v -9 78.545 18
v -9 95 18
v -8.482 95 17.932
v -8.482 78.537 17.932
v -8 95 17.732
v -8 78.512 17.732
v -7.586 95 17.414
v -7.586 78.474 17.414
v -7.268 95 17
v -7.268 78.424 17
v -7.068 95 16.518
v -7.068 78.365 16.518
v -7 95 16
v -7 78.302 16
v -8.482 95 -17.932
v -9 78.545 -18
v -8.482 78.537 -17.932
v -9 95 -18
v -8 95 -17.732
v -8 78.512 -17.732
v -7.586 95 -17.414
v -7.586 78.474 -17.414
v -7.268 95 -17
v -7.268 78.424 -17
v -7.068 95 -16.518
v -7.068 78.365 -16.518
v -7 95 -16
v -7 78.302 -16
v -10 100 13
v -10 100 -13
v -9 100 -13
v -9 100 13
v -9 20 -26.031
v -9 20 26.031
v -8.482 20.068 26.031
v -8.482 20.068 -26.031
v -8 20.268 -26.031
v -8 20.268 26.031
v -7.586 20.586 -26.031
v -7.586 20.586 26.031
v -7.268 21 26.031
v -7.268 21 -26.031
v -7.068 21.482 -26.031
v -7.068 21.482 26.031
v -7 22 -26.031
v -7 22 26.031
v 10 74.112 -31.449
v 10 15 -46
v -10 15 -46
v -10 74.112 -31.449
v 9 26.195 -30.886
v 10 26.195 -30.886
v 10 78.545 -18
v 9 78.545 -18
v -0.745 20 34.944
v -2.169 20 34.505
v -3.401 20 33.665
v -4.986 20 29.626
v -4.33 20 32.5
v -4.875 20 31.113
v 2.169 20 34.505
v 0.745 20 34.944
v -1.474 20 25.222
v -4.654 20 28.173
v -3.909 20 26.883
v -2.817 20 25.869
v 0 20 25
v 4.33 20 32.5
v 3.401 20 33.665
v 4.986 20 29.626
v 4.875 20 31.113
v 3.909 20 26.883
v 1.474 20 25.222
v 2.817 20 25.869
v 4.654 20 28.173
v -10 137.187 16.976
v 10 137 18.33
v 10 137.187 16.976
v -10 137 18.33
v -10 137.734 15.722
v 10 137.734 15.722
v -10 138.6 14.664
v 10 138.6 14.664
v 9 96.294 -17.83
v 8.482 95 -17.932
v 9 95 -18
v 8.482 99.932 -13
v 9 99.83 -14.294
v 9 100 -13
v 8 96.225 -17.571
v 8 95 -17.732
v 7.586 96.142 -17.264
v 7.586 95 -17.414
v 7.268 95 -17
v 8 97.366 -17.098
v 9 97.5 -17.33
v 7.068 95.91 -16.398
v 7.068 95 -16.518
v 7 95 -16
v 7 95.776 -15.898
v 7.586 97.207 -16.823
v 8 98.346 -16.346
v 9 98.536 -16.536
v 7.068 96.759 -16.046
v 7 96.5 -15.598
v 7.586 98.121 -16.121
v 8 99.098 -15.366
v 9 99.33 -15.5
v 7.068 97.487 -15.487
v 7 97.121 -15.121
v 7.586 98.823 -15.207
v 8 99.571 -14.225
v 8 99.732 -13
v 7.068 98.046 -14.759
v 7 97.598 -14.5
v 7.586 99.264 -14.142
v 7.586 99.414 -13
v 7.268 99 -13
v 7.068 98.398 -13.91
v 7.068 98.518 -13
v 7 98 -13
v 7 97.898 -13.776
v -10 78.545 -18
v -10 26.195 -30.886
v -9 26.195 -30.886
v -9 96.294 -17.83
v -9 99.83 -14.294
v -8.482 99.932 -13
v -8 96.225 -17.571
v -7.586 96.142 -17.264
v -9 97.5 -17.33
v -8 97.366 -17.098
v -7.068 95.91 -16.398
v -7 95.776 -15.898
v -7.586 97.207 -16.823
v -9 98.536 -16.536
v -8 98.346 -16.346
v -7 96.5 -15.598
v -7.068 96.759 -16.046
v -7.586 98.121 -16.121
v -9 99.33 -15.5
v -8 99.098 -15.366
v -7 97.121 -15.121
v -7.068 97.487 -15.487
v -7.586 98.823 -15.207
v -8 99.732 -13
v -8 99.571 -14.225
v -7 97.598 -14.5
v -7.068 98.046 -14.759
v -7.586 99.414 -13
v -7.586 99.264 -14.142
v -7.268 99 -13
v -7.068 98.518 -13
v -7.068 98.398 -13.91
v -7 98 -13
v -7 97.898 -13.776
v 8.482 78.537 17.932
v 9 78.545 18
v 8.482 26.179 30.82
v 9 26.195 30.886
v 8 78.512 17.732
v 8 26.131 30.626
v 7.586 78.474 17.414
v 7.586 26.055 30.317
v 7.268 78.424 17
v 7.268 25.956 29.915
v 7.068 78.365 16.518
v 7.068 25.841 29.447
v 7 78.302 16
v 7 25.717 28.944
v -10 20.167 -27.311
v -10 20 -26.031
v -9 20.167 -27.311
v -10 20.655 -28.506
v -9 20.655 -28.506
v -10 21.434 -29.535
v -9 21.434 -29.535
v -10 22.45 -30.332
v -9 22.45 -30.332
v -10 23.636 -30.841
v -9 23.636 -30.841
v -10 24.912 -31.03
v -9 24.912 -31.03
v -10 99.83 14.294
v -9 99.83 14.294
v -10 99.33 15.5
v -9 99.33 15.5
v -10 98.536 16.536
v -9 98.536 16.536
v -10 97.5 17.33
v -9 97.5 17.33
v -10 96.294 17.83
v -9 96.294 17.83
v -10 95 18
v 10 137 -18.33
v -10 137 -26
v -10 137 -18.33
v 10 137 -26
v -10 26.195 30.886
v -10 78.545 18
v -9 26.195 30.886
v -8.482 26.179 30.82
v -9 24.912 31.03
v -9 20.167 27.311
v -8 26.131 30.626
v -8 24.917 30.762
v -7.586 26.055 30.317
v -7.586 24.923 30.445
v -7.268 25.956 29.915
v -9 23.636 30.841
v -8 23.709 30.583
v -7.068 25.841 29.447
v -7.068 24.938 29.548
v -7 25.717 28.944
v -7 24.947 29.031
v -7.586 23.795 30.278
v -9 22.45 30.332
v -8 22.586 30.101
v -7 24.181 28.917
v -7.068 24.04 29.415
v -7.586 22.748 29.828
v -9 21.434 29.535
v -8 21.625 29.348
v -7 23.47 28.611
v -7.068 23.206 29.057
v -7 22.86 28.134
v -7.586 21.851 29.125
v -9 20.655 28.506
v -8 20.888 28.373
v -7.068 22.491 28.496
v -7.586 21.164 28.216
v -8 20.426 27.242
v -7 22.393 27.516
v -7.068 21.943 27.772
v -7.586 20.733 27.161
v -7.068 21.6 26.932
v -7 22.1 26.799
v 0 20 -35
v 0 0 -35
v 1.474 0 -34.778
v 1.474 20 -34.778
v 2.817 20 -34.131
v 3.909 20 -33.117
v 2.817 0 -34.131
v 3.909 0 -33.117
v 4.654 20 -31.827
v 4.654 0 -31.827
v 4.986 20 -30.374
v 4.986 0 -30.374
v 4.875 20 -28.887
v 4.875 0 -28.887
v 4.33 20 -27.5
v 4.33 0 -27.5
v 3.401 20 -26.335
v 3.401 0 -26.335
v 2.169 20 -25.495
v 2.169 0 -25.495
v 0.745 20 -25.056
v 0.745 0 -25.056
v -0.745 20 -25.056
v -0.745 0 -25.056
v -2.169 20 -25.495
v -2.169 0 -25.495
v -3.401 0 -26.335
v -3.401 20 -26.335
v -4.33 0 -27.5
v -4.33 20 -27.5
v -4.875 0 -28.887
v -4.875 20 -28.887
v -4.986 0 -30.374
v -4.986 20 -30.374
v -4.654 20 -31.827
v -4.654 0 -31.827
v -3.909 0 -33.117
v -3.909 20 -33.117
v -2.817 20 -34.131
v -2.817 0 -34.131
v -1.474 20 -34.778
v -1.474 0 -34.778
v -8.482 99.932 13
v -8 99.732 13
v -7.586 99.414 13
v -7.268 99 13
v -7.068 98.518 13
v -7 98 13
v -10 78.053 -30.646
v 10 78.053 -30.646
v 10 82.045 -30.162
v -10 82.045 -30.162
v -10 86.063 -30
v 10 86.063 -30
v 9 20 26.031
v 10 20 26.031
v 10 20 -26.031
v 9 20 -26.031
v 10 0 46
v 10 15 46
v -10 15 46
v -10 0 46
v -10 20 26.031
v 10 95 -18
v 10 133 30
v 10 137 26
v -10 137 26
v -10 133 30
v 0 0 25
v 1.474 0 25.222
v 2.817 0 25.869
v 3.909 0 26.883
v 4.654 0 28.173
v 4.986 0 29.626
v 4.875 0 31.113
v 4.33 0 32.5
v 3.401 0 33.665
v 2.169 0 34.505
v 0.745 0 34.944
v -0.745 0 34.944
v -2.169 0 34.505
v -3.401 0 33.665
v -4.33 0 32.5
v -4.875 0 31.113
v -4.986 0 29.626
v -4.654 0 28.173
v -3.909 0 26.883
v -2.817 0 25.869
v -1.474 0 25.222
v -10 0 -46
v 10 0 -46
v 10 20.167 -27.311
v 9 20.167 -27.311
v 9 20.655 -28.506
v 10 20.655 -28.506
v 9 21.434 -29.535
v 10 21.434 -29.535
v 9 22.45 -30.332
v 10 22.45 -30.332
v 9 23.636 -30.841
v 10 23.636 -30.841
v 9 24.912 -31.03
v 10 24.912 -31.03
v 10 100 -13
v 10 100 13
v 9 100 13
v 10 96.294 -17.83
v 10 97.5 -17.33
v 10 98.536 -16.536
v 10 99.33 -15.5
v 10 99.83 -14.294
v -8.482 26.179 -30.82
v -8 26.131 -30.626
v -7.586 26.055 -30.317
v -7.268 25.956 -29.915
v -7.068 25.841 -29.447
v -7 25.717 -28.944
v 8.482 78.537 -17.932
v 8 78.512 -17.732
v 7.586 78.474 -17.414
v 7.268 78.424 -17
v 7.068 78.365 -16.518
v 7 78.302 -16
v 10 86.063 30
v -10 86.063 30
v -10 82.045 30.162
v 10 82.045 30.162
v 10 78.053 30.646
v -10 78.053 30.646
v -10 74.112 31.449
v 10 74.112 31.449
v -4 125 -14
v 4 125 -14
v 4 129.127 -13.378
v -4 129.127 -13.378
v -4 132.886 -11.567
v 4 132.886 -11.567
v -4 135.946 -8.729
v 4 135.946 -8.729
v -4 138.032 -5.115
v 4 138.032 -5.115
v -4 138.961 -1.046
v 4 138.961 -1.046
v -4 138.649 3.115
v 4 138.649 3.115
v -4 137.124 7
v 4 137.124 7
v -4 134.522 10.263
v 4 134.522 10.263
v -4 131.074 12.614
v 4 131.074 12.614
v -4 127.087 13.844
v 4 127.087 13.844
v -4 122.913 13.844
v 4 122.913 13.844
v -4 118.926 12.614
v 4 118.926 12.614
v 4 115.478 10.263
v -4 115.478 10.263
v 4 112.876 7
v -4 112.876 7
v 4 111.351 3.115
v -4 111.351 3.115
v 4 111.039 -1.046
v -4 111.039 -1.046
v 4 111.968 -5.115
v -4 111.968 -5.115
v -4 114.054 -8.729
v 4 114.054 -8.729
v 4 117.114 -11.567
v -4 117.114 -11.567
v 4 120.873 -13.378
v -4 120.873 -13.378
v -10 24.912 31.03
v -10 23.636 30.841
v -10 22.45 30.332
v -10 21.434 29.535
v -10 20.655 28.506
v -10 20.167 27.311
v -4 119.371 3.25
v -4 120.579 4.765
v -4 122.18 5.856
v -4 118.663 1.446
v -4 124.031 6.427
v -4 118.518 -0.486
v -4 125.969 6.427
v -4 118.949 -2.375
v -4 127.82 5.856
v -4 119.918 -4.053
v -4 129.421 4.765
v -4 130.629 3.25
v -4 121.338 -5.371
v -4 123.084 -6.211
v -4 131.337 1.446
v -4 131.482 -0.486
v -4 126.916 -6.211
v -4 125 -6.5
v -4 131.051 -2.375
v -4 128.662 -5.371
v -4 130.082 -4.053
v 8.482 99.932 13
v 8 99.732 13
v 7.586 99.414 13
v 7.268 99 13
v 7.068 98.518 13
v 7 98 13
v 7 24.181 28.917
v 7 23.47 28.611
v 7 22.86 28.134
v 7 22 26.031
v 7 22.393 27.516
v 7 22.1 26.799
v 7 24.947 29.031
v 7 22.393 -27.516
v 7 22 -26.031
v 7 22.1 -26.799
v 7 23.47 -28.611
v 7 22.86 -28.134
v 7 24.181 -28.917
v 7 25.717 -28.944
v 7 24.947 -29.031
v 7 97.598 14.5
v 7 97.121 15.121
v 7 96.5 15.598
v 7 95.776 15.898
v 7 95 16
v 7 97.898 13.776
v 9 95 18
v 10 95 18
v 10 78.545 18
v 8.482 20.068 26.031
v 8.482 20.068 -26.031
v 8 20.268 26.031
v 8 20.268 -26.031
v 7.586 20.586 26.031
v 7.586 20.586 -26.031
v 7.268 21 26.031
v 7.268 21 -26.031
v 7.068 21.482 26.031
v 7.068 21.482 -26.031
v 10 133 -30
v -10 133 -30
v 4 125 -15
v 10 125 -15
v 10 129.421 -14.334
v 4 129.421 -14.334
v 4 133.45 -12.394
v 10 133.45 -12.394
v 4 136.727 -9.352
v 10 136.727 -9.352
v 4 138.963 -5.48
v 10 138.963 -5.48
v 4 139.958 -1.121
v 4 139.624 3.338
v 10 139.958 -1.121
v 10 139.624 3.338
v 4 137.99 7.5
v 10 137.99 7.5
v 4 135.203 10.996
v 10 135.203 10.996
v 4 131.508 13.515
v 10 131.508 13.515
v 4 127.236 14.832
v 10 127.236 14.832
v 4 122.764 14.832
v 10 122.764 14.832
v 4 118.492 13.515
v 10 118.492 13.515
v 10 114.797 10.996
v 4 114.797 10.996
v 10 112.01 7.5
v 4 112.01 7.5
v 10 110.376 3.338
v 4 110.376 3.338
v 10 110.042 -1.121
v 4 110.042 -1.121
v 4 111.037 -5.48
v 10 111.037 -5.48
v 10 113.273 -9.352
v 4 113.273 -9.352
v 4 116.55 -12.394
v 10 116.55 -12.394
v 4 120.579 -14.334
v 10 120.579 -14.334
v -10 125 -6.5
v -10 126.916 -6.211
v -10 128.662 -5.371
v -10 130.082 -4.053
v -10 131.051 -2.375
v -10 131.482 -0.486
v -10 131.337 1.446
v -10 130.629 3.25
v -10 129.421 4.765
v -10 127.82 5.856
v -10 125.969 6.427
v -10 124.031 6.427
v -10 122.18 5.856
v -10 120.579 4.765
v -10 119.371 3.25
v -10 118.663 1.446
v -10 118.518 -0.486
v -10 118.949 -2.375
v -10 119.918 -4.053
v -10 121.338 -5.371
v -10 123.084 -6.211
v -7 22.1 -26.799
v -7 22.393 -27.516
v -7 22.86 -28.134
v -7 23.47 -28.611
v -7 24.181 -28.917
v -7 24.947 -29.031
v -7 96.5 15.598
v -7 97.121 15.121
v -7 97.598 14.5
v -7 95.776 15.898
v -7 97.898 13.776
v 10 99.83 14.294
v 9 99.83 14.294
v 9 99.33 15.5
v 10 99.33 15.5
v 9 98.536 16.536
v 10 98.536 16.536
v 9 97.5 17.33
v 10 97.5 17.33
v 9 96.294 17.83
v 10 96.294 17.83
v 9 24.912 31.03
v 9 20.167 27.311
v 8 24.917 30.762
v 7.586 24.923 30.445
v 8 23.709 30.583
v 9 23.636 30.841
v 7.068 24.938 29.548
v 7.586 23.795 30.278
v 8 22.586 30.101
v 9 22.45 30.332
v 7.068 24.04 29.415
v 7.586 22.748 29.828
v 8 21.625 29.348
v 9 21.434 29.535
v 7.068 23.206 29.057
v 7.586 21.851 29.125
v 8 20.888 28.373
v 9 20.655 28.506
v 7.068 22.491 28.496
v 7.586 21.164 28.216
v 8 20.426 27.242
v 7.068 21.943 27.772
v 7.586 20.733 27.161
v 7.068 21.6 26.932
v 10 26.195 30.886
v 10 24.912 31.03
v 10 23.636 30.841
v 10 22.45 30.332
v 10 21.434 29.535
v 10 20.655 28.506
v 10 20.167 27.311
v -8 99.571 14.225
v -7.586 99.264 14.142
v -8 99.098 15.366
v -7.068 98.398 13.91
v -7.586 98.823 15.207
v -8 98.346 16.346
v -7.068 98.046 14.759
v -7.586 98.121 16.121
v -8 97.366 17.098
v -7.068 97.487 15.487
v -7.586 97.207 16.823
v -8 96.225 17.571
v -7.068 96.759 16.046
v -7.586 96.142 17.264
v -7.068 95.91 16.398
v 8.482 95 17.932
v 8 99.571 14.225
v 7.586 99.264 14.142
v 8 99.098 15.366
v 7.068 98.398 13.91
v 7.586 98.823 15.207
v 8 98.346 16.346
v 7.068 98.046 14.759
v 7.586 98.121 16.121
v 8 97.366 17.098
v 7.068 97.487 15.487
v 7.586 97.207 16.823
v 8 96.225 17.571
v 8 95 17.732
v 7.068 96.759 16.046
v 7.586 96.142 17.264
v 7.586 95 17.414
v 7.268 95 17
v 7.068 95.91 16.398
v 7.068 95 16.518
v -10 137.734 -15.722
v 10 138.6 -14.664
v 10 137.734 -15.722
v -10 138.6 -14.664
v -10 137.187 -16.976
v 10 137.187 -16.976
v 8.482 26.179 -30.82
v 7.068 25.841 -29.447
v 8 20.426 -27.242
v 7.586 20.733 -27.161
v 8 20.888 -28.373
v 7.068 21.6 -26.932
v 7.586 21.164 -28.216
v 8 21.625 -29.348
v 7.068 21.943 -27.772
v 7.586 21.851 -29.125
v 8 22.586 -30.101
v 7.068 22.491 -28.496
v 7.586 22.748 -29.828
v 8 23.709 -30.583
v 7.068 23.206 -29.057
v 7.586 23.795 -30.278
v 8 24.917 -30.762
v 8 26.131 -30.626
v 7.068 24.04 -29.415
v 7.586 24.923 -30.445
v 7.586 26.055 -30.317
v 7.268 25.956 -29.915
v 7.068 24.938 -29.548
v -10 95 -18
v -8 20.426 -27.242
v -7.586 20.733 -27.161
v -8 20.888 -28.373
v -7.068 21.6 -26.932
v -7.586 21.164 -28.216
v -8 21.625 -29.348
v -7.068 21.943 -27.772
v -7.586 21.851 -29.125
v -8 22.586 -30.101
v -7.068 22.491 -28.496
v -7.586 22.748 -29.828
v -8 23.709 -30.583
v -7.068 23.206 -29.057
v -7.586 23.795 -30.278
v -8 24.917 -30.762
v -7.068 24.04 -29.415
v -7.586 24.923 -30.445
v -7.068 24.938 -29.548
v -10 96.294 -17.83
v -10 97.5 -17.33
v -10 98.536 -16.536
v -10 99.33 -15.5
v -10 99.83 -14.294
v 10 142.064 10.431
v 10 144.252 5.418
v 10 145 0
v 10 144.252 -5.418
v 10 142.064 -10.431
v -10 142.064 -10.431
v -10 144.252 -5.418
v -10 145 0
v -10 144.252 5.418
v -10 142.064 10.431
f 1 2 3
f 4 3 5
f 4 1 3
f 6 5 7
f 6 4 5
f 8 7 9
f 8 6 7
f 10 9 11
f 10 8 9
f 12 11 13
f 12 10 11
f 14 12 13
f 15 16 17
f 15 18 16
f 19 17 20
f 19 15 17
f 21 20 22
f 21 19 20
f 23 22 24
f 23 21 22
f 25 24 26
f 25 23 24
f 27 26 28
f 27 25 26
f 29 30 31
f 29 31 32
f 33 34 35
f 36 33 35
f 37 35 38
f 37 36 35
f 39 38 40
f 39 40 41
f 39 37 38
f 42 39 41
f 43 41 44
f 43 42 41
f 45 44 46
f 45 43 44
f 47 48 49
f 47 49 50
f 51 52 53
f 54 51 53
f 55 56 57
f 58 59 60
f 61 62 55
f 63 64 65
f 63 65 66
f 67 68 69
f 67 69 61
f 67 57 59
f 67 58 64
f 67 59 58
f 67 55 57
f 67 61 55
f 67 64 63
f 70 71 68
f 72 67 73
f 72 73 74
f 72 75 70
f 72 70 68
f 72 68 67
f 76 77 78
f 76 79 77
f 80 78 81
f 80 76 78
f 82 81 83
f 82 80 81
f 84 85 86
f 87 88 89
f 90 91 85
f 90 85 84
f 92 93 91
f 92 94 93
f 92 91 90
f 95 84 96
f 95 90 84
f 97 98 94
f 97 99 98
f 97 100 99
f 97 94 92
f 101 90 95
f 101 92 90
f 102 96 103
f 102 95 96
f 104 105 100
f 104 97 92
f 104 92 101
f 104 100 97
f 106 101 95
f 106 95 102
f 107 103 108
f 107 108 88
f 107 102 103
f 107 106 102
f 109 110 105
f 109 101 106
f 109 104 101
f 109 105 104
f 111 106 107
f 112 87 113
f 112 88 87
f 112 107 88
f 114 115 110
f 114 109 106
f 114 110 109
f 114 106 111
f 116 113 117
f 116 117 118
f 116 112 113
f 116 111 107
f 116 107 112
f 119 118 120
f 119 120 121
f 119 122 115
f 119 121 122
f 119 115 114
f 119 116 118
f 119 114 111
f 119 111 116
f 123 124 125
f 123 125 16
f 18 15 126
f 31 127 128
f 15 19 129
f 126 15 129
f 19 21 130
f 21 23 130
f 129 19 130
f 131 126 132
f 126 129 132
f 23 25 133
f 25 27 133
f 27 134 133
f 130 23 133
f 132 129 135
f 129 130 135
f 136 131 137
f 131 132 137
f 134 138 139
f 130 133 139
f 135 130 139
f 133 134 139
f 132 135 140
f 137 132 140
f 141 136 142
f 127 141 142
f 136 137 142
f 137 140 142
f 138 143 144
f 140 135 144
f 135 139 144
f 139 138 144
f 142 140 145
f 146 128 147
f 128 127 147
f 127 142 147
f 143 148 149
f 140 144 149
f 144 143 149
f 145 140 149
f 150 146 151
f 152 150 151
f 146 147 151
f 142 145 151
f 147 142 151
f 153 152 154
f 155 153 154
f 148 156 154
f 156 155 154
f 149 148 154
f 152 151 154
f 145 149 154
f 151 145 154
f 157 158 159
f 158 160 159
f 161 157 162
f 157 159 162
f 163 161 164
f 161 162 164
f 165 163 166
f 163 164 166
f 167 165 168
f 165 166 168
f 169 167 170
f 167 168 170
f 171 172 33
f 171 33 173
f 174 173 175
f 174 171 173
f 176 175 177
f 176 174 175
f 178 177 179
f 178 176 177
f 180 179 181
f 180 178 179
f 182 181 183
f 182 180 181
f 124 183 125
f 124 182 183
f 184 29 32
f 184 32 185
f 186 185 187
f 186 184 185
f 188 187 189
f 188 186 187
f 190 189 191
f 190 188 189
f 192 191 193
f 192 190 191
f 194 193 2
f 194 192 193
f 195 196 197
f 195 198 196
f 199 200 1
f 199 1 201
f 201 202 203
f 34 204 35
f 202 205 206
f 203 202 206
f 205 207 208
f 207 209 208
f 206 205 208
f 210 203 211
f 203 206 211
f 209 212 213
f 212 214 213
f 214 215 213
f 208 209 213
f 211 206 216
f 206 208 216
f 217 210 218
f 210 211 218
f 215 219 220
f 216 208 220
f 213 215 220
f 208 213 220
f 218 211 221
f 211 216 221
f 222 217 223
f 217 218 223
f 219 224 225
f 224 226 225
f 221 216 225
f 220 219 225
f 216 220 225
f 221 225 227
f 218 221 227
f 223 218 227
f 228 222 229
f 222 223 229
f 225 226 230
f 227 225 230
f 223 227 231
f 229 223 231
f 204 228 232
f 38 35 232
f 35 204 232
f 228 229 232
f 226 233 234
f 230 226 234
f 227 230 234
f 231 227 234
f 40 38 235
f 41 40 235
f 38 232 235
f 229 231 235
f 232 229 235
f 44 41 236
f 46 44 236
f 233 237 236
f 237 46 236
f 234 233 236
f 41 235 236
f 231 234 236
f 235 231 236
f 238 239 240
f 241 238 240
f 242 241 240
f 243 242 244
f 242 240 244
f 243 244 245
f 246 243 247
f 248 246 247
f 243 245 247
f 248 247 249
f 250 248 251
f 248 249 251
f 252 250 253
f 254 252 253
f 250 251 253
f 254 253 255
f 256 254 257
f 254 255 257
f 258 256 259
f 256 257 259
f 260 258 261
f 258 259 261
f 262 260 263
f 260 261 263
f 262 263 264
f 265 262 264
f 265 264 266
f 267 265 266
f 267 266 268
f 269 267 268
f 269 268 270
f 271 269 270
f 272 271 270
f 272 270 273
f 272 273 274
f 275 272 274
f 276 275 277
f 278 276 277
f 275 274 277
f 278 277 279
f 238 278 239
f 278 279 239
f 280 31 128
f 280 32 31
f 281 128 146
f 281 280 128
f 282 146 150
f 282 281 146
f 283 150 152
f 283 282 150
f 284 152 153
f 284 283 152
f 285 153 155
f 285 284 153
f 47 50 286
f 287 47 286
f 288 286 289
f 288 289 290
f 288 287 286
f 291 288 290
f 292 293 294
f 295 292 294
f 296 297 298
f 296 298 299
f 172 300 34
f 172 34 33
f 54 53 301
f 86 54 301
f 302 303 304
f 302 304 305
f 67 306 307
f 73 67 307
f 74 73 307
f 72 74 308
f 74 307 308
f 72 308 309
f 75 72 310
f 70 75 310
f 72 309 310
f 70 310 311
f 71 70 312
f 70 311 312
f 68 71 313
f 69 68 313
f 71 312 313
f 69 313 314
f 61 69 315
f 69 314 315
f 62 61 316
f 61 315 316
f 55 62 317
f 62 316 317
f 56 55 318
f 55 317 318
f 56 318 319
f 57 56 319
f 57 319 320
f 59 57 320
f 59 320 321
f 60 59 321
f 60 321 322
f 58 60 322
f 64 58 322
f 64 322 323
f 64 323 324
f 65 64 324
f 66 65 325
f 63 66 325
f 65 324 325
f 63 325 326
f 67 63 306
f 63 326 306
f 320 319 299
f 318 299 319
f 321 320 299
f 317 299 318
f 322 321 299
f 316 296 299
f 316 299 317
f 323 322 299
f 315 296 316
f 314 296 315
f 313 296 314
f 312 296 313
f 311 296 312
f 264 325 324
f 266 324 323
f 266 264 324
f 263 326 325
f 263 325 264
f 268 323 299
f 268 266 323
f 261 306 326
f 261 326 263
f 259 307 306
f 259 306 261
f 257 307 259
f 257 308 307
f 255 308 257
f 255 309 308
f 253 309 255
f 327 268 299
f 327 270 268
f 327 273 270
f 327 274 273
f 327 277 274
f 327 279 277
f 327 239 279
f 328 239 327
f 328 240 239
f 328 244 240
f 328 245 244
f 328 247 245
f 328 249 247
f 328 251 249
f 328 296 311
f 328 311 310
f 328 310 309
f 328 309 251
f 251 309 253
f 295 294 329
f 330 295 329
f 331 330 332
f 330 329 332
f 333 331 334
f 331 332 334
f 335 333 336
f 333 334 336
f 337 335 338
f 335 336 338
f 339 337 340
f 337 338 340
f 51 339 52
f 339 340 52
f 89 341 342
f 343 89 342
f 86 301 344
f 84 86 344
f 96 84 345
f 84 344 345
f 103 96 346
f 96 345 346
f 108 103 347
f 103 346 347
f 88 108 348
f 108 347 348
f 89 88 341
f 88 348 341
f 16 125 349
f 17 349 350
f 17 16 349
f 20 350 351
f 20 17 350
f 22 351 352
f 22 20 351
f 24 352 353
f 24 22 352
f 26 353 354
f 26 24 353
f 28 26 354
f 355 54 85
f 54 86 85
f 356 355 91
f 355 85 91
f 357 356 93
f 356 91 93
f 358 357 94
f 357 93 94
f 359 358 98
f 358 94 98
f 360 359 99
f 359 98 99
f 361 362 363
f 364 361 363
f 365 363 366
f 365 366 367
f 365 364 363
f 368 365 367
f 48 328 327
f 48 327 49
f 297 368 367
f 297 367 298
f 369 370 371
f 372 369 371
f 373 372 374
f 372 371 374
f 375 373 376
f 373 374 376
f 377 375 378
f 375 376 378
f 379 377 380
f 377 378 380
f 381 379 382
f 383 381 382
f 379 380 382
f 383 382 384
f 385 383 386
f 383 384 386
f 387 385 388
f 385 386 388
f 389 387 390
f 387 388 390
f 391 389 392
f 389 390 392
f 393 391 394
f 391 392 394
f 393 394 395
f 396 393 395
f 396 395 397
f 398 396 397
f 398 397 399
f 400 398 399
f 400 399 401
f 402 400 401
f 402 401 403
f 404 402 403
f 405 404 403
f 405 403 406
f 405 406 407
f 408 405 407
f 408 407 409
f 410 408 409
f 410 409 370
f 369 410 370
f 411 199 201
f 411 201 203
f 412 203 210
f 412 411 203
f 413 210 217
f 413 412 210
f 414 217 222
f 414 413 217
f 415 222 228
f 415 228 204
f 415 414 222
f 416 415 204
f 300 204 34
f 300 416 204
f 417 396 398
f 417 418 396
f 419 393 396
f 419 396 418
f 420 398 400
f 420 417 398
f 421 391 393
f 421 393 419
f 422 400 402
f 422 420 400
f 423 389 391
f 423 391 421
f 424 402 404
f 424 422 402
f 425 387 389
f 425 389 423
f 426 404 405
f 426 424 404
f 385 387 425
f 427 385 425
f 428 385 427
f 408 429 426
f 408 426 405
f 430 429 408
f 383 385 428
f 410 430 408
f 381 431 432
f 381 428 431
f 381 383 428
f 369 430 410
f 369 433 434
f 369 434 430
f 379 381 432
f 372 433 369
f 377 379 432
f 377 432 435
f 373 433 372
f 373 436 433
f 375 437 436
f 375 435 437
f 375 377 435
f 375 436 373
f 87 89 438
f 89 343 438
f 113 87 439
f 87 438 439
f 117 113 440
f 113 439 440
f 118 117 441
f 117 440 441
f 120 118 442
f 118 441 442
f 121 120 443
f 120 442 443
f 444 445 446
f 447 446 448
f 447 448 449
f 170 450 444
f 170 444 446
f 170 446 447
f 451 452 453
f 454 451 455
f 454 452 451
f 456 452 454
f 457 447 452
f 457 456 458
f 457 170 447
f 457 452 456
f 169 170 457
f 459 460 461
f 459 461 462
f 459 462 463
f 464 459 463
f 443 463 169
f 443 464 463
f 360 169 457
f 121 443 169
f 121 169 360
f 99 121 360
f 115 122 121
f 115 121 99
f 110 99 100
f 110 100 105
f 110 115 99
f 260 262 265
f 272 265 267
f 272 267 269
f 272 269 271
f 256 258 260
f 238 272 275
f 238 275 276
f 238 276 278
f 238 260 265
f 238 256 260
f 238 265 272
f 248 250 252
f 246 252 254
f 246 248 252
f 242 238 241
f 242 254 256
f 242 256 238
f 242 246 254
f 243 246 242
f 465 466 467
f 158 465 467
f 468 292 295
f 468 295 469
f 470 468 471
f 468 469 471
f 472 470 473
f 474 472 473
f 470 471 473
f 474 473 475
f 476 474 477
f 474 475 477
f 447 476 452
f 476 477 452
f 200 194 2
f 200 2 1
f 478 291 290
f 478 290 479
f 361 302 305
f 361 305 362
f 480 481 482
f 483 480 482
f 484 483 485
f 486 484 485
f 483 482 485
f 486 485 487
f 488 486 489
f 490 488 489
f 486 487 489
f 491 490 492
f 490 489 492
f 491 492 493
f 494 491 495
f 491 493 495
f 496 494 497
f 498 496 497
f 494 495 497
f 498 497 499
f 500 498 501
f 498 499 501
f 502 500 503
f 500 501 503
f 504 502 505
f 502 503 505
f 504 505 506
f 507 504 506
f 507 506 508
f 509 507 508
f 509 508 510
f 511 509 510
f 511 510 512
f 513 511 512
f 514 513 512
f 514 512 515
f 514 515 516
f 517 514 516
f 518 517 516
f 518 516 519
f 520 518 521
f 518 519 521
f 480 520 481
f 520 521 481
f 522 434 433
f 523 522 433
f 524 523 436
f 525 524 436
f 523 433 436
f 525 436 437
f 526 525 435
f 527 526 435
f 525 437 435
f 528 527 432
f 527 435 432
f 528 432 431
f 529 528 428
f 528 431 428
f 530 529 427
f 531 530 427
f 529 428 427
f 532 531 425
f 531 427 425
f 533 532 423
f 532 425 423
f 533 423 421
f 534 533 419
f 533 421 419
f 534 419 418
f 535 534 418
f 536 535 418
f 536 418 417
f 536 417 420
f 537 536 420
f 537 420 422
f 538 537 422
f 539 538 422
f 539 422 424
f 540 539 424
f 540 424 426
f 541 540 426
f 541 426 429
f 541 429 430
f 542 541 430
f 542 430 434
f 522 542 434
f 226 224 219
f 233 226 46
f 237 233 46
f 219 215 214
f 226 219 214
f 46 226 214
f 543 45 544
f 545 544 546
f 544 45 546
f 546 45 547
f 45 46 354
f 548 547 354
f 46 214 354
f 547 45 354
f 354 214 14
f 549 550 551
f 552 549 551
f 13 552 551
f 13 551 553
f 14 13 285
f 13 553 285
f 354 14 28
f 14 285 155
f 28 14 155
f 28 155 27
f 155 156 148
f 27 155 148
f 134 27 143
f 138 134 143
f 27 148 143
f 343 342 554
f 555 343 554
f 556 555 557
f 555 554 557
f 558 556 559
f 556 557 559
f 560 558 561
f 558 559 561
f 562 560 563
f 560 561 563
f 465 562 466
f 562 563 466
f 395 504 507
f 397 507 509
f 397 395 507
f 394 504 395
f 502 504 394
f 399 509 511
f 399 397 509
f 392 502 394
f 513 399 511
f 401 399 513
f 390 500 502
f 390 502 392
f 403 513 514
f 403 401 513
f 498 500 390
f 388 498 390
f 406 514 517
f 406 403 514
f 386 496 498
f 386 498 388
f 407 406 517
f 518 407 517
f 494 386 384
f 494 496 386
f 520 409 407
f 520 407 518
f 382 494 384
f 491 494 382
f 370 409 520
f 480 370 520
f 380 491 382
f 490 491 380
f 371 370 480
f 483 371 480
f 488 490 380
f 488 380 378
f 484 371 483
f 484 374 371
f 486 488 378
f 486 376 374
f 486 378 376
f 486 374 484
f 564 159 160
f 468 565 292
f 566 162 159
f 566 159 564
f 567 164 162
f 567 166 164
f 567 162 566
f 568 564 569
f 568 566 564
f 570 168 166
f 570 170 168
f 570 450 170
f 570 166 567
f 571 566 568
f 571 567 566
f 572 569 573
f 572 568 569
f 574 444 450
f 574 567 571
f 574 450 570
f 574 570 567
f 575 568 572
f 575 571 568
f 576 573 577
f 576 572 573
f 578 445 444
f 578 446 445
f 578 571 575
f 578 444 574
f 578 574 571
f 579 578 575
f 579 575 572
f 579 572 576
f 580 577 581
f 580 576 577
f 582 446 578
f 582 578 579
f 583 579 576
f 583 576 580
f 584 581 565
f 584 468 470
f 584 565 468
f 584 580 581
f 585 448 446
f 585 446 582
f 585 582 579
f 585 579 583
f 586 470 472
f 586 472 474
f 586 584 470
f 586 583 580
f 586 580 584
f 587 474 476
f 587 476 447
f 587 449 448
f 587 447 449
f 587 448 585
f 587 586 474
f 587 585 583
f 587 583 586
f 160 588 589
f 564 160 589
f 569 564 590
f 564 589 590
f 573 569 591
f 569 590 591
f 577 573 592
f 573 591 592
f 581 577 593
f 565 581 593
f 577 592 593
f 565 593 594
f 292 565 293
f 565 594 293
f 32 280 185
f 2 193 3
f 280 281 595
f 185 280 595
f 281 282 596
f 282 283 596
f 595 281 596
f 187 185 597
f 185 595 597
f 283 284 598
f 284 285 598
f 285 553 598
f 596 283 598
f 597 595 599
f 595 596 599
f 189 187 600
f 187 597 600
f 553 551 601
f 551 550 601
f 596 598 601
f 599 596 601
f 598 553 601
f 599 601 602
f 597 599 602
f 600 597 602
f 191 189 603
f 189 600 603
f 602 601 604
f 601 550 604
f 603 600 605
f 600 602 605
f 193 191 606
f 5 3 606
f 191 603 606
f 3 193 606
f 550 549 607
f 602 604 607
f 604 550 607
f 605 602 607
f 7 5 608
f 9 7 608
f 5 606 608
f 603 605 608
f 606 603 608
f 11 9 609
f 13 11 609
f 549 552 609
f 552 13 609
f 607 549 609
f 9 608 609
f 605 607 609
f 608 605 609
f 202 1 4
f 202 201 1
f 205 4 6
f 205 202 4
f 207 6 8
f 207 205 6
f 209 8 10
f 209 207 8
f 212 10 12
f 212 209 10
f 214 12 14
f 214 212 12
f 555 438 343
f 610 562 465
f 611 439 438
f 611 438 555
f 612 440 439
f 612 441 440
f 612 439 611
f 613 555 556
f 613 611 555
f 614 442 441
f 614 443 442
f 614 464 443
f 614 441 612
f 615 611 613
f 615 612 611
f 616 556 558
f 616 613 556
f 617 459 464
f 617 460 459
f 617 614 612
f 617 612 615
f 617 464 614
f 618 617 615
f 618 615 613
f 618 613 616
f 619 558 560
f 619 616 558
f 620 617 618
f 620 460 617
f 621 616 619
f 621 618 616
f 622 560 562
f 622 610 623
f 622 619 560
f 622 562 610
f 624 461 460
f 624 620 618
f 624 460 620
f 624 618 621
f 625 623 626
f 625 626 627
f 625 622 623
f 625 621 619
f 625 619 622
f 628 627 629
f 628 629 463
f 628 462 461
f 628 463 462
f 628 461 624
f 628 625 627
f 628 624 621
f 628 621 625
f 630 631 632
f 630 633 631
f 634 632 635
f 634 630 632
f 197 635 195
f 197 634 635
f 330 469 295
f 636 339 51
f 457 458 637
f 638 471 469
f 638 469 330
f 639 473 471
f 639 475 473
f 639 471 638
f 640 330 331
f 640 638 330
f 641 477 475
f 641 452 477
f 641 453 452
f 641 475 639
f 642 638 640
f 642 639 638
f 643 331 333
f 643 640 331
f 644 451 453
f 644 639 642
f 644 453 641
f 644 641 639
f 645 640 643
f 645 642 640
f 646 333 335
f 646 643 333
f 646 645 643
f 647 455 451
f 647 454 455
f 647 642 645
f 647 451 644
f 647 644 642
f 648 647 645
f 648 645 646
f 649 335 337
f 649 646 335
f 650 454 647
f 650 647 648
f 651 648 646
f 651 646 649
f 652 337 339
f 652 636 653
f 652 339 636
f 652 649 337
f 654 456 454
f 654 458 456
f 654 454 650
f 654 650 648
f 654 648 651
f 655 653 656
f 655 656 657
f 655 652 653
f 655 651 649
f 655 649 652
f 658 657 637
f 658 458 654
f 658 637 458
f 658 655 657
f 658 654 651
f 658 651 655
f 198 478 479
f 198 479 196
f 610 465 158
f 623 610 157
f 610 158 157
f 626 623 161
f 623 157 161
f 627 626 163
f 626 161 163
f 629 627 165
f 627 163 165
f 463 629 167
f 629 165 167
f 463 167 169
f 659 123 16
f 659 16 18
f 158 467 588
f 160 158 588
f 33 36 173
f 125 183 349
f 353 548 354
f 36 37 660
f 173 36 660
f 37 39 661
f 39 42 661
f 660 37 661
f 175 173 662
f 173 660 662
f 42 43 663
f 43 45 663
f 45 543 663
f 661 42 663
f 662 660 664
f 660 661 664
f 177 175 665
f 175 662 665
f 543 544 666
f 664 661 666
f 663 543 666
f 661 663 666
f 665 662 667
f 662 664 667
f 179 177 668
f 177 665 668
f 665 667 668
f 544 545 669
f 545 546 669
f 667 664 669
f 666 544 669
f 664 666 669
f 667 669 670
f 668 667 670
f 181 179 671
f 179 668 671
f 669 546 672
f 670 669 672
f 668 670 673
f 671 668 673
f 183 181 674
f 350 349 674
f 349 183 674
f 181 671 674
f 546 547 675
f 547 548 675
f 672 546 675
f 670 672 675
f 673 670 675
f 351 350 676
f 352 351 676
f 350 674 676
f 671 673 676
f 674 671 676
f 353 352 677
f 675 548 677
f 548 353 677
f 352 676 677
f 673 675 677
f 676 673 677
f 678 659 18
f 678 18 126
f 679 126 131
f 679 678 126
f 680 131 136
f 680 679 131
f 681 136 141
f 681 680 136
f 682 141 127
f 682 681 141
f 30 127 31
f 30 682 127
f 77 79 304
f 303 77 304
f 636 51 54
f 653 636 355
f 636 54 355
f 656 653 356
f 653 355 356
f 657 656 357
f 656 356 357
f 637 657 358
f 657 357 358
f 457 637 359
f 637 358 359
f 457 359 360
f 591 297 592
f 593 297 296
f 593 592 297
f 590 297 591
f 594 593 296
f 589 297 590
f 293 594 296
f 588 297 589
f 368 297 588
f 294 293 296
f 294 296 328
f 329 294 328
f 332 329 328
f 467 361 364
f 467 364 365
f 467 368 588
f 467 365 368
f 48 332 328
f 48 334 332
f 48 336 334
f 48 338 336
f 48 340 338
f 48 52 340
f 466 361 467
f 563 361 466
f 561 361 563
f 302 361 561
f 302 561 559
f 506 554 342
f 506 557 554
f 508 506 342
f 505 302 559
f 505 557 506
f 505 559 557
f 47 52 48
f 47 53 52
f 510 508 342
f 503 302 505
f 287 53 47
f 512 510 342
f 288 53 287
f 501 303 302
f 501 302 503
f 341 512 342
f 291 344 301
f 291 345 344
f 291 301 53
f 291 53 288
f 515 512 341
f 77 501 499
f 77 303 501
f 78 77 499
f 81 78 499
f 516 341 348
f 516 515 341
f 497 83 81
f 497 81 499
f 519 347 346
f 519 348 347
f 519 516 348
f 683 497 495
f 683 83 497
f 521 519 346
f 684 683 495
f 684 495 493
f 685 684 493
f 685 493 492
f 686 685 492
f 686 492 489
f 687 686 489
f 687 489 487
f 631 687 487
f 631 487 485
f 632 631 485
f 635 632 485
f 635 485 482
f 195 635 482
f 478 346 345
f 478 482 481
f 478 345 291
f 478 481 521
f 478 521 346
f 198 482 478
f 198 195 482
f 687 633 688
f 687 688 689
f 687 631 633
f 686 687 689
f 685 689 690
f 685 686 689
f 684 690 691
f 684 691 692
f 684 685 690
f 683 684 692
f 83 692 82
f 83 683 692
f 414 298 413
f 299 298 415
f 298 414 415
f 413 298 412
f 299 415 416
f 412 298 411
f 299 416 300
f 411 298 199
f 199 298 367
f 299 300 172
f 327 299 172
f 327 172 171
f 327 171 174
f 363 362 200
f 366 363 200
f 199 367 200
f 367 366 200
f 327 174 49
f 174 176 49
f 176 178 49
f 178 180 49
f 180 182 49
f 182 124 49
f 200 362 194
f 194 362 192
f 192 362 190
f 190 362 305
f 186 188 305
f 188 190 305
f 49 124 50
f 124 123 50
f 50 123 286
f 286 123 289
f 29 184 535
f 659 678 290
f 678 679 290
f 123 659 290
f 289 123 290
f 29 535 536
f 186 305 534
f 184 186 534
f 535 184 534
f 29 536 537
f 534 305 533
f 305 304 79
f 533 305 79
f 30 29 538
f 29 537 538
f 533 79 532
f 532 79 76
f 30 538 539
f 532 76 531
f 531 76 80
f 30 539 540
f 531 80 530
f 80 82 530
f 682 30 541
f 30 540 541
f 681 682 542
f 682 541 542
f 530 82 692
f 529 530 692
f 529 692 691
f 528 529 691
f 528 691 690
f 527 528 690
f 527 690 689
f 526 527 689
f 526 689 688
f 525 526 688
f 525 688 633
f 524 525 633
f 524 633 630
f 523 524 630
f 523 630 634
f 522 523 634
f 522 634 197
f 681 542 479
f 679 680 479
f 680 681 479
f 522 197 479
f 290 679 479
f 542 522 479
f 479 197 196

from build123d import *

# Parameters (mm, degrees)
BOSS_EXTRUDE1_DEPTH  = 10
CUT_EXTRUDE1_DEPTH   = 3
FILLET1_R            = 2
FILLET1_OF_MIRROR1_R = 2
SKETCH3_R            = 15
SKETCH3_R_2          = 14
CUT_EXTRUDE2_DEPTH   = 6
SKETCH3_3_R          = 14
CUT_EXTRUDE3_DEPTH   = 14
SKETCH3_4_R          = 6.5
CUT_EXTRUDE4_DEPTH   = 154.430766146
SKETCH4_R            = 5
CUT_EXTRUDE5_DEPTH   = 20
FILLET2_R            = 5


with BuildPart() as part:
    # Sketch1 → Boss-Extrude1 (new, symmetric)
    with BuildSketch(Plane(origin=(0, 0, 0), x_dir=(0, 0, -1), z_dir=(1, 0, 0))):
        with BuildLine():
            Line((-16, 137), (-26, 137))
            Line((-26, 137), (-30, 133))
            Line((-30, 133), (-30, 86.06334964))
            ThreePointArc((-30, 86.06334964), (-30.363636327, 80.044097084), (-31.449256053, 74.112397284))
            Line((-31.449256053, 74.112397284), (-46, 15))
            Line((-46, 15), (-46, 0))
            Line((-46, 0), (46, 0))
            Line((46, 0), (46, 15))
            Line((46, 15), (31.449256053, 74.112397284))
            ThreePointArc((31.449256053, 74.112397284), (30.363636327, 80.044097084), (30, 86.06334964))
            Line((30, 86.06334964), (30, 133))
            Line((30, 133), (26, 137))
            Line((26, 137), (16, 137))
            ThreePointArc((16, 137), (0, 145), (-16, 137))
        make_face()
    extrude(amount=BOSS_EXTRUDE1_DEPTH, both=True)

    # Sketch2 → Cut-Extrude1 (cut)
    with BuildSketch(Plane(origin=(10, 0, 0), x_dir=(0, 0, -1), z_dir=(1, 0, 0))):
        with BuildLine():
            Line((13, 100), (-13, 100))
            ThreePointArc((-13, 100), (-16.535533906, 98.535533906), (-18, 95))
            Line((-18, 95), (-18, 78.544796086))
            Line((-18, 78.544796086), (-30.886080209, 26.195095236))
            ThreePointArc((-30.886080209, 26.195095236), (-29.966452179, 21.915804495), (-26.031005815, 20))
            Line((-26.031005815, 20), (26.031005815, 20))
            ThreePointArc((26.031005815, 20), (29.966452179, 21.915804495), (30.886080209, 26.195095236))
            Line((30.886080209, 26.195095236), (18, 78.544796086))
            Line((18, 78.544796086), (18, 95))
            ThreePointArc((18, 95), (16.535533906, 98.535533906), (13, 100))
        make_face()
    cut_extrude1 = extrude(amount=-CUT_EXTRUDE1_DEPTH, mode=Mode.SUBTRACT)

    # Fillet1
    fillet1_edges = [part.edges().sort_by_distance(p)[0] for p in [
        (7, 86.772398043, 18),
        (7, 98.535533906, 16.535533906),
        (7, 100, 0),
        (7, 98.535533906, -16.535533906),
        (7, 86.772398043, -18),
        (7, 52.369945661, -24.443040105),
        (7, 21.915804495, -29.966452179),
        (7, 20, 0),
        (7, 21.915804495, 29.966452179),
        (7, 52.369945661, 24.443040105),
    ]]
    fillet(fillet1_edges, radius=FILLET1_R)

    # Mirror1: Cut-Extrude1 across plane
    add(cut_extrude1.mirror(Plane(origin=(0, 0, 0), x_dir=(0, 0, 1), z_dir=(1, 0, 0))), mode=Mode.SUBTRACT)

    # Fillet1 of Mirror1
    fillet1_of_mirror1_edges = [part.edges().sort_by_distance(p)[0] for p in [
        (-7, 86.772398043, 18),
        (-7, 98.535533906, 16.535533906),
        (-7, 100, 0),
        (-7, 98.535533906, -16.535533906),
        (-7, 86.772398043, -18),
        (-7, 52.369945661, -24.443040105),
        (-7, 21.915804495, -29.966452179),
        (-7, 20, 0),
        (-7, 21.915804495, 29.966452179),
        (-7, 52.369945661, 24.443040105),
    ]]
    fillet(fillet1_of_mirror1_edges, radius=FILLET1_OF_MIRROR1_R)

    # Sketch3 → Cut-Extrude2 (cut)
    with BuildSketch(Plane(origin=(10, 0, 0), x_dir=(0, 0, -1), z_dir=(1, 0, 0))):
        with Locations((0, 125)):
            Circle(SKETCH3_R)
        with Locations((0, 125)):
            Circle(SKETCH3_R_2, mode=Mode.SUBTRACT)
    extrude(amount=-CUT_EXTRUDE2_DEPTH, mode=Mode.SUBTRACT)

    # Sketch3<3> → Cut-Extrude3 (cut)
    with BuildSketch(Plane(origin=(10, 0, 0), x_dir=(0, 0, -1), z_dir=(1, 0, 0))):
        with Locations((0, 125)):
            Circle(SKETCH3_3_R)
    extrude(amount=-CUT_EXTRUDE3_DEPTH, mode=Mode.SUBTRACT)

    # Sketch3<4> → Cut-Extrude4 (cut, through all)
    with BuildSketch(Plane(origin=(10, 0, 0), x_dir=(0, 0, -1), z_dir=(1, 0, 0))):
        with Locations((0, 125)):
            Circle(SKETCH3_4_R)
    extrude(amount=-CUT_EXTRUDE4_DEPTH, mode=Mode.SUBTRACT)

    # Sketch4 → Cut-Extrude5 (cut)
    with BuildSketch(Plane.XZ):
        with Locations((0, 30)):
            Circle(SKETCH4_R)
        with Locations((0, -30)):
            Circle(SKETCH4_R)
    extrude(amount=-CUT_EXTRUDE5_DEPTH, mode=Mode.SUBTRACT)

    # Fillet2
    fillet2_edges = [part.edges().sort_by_distance(p)[0] for p in [
        (0, 137, -16),
        (0, 137, 16),
    ]]
    fillet(fillet2_edges, radius=FILLET2_R)


solid = part.part
